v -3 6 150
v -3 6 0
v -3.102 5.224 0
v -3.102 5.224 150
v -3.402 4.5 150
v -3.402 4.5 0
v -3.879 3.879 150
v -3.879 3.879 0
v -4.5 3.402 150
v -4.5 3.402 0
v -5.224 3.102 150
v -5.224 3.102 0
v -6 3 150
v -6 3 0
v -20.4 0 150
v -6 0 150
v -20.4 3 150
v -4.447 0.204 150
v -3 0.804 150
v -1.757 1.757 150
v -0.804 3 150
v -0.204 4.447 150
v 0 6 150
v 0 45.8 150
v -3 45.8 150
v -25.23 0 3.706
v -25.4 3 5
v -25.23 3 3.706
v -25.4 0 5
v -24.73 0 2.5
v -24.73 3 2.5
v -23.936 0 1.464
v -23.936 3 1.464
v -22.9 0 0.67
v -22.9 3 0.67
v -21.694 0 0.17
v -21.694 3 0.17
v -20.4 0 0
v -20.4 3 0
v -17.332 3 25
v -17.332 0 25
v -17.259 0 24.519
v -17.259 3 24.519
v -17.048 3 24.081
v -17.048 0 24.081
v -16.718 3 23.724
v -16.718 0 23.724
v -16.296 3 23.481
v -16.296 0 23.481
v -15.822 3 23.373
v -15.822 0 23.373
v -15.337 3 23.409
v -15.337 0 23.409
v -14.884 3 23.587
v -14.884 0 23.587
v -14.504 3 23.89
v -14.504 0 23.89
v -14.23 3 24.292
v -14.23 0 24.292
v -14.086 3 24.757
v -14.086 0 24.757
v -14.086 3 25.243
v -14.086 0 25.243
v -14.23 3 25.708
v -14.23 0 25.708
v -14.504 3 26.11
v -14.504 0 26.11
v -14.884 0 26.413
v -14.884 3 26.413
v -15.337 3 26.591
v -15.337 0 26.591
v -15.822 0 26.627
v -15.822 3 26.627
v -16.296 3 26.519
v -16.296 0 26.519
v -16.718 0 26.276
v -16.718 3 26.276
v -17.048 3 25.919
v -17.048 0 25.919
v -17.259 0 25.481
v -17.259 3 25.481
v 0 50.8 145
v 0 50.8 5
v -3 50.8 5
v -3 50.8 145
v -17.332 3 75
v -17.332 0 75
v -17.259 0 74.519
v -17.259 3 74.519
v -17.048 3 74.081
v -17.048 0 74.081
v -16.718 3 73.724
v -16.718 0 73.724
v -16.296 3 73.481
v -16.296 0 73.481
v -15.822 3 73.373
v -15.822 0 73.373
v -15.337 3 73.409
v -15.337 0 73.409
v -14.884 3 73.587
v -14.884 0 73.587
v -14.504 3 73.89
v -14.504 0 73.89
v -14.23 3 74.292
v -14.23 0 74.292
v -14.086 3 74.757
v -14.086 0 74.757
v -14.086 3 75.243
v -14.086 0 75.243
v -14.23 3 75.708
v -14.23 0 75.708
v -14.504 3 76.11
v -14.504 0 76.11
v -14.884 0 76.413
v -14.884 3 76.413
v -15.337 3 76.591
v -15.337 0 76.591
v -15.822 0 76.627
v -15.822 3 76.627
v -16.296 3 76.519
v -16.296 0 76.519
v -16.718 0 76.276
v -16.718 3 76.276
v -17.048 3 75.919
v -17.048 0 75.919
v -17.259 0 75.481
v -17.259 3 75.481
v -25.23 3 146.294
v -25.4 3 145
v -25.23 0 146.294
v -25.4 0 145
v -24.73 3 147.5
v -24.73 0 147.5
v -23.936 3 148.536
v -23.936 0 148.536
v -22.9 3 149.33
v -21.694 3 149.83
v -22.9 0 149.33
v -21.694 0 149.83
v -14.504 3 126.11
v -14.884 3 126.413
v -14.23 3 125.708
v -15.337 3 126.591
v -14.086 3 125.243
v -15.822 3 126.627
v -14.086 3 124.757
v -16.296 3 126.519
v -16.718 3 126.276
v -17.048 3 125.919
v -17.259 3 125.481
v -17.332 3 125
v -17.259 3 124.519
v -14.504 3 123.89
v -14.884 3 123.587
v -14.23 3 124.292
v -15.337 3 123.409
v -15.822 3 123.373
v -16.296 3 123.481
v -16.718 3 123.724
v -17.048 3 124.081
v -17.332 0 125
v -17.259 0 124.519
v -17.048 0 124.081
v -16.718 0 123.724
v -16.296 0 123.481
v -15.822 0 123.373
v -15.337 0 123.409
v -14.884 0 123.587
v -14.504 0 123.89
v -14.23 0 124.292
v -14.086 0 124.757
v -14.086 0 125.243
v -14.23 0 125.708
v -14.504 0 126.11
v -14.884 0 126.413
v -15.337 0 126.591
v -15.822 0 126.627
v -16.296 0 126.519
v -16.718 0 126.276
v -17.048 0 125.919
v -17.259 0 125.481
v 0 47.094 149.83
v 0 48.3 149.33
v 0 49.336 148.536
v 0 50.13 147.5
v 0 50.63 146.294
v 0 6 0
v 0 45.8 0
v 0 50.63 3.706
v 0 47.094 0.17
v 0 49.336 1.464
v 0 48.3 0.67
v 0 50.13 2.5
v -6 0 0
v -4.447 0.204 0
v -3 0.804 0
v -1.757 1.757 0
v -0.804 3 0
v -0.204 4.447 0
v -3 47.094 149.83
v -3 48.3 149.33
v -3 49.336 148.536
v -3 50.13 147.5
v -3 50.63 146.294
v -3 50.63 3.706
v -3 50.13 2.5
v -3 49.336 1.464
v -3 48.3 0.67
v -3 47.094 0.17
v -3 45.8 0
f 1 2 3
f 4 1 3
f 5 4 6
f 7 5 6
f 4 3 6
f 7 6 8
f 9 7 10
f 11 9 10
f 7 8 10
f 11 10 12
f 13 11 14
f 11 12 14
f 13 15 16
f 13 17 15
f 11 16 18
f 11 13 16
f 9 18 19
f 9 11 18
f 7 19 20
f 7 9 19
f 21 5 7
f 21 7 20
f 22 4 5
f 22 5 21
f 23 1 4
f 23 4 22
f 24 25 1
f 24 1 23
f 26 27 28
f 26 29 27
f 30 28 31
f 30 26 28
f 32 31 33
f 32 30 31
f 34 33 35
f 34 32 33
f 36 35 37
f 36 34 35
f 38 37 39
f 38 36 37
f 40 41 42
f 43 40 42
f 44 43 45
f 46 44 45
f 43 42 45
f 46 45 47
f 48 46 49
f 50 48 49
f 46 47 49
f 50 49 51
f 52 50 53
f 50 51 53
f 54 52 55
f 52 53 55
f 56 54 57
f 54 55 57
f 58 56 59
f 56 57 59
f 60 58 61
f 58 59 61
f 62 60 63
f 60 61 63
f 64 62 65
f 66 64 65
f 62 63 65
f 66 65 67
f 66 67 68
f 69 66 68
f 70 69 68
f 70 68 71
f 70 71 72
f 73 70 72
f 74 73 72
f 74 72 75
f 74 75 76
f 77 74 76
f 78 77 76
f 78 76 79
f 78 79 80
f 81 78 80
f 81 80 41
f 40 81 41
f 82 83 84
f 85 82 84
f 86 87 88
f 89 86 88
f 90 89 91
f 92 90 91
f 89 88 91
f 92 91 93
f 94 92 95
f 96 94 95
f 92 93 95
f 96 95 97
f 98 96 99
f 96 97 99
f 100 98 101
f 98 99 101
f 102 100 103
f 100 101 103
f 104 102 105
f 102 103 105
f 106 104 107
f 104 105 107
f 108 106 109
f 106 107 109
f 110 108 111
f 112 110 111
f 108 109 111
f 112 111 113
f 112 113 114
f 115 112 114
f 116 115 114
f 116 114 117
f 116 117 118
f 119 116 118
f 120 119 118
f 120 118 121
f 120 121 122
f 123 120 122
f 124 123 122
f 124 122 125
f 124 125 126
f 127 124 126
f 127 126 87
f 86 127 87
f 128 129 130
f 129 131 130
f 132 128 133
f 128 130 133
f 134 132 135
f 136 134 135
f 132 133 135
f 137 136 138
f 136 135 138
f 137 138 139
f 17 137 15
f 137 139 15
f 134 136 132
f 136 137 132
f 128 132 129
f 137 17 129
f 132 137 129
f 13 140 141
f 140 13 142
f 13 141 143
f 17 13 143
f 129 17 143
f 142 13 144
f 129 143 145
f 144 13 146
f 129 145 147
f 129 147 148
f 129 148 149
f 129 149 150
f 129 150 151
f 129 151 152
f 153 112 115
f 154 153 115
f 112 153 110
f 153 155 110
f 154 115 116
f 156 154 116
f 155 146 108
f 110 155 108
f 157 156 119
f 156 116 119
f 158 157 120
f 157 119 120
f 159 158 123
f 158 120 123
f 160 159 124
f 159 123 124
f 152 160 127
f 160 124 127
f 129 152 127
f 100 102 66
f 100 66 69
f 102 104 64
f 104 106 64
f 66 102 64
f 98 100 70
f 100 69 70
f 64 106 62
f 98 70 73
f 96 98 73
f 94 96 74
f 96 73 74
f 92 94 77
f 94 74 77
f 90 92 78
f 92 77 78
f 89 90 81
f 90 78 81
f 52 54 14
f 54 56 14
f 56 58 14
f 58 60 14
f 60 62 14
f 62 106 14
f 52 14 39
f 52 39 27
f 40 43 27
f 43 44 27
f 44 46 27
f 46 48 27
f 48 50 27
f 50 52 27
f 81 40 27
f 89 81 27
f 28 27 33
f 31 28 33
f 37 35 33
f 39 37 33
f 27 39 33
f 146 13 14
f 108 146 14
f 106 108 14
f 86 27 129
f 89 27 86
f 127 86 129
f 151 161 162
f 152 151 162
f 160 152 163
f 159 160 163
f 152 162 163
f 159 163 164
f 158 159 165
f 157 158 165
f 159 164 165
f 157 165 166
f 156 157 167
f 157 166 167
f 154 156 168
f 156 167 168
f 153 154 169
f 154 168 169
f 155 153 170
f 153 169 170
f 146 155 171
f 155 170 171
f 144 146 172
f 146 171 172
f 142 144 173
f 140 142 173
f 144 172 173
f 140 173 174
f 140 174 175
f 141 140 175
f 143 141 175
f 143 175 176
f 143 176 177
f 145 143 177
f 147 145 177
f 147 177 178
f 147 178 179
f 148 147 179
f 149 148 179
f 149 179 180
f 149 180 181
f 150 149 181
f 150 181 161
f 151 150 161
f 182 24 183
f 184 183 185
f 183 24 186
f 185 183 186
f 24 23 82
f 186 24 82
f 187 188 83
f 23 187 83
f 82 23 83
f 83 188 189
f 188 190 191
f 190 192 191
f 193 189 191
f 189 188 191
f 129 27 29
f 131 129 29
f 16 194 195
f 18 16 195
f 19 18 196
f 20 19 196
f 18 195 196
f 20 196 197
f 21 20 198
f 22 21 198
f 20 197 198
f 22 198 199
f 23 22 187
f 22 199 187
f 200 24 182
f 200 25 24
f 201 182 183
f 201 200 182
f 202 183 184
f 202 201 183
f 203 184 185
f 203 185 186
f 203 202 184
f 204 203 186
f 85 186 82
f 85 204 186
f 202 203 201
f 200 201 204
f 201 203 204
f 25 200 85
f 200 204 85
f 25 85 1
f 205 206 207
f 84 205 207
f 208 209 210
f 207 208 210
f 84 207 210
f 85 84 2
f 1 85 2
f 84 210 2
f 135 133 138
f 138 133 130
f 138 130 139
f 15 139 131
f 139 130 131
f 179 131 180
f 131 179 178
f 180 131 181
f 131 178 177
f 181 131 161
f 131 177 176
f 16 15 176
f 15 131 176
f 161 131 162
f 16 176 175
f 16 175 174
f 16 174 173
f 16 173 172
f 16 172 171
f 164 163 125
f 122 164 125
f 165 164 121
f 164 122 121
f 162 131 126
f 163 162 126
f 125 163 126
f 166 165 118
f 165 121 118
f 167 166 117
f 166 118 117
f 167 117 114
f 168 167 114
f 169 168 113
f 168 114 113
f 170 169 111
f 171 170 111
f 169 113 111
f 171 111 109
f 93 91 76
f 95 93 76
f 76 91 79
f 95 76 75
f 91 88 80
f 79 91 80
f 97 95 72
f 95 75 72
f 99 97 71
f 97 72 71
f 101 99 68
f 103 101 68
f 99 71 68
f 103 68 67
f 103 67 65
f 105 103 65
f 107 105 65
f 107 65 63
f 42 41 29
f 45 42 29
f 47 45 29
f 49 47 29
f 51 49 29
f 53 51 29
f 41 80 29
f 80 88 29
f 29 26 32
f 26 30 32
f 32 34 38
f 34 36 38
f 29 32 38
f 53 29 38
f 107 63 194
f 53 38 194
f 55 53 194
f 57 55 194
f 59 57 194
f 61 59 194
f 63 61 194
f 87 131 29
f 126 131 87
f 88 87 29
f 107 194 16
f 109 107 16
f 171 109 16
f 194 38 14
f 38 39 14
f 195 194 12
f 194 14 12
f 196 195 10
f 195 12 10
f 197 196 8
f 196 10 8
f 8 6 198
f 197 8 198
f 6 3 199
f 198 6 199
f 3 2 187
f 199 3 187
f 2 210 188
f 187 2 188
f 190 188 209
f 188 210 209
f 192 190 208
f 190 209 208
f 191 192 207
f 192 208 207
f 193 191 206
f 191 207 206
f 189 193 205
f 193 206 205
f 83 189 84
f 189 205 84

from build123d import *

# Parameters (mm, degrees)
BASE_FLANGE1_DEPTH           = 150
F_30_0_1285_DIAMETER_HOLE1_D = 3.2639
FILLET1_R                    = 5


# Sheet-metal steps are written as plain solids
with BuildPart() as part:
    # Sketch1 → Base-Flange1 (new body)
    with BuildSketch(Plane.XY):
        with BuildLine():
            Line((-25.4, 0), (-6, 0))
            ThreePointArc((-6, 0), (-1.757359313, 1.757359313), (0, 6))
            Line((0, 6), (0, 50.8))
            Line((0, 50.8), (-3, 50.8))
            Line((-3, 50.8), (-3, 6))
            ThreePointArc((-3, 6), (-3.878679656, 3.878679656), (-6, 3))
            Line((-6, 3), (-25.4, 3))
            Line((-25.4, 3), (-25.4, 0))
        make_face()
    extrude(amount=BASE_FLANGE1_DEPTH)

    # #30 (0.1285) Diameter Hole1 (through all)
    with Locations(Plane(origin=(0, 3, 0), x_dir=(1, 0, 0), z_dir=(0, 1, 0))):
        with Locations((-15.7, -25), (-15.7, -75), (-15.7, -125)):
            Hole(F_30_0_1285_DIAMETER_HOLE1_D / 2)

    # Fillet1
    fillet1_edges = [part.edges().sort_by_distance(p)[0] for p in [
        (-1.5, 50.8, 150),
        (-1.5, 50.8, 0),
        (-25.4, 1.5, 150),
        (-25.4, 1.5, 0),
    ]]
    fillet(fillet1_edges, radius=FILLET1_R)


solid = part.part
